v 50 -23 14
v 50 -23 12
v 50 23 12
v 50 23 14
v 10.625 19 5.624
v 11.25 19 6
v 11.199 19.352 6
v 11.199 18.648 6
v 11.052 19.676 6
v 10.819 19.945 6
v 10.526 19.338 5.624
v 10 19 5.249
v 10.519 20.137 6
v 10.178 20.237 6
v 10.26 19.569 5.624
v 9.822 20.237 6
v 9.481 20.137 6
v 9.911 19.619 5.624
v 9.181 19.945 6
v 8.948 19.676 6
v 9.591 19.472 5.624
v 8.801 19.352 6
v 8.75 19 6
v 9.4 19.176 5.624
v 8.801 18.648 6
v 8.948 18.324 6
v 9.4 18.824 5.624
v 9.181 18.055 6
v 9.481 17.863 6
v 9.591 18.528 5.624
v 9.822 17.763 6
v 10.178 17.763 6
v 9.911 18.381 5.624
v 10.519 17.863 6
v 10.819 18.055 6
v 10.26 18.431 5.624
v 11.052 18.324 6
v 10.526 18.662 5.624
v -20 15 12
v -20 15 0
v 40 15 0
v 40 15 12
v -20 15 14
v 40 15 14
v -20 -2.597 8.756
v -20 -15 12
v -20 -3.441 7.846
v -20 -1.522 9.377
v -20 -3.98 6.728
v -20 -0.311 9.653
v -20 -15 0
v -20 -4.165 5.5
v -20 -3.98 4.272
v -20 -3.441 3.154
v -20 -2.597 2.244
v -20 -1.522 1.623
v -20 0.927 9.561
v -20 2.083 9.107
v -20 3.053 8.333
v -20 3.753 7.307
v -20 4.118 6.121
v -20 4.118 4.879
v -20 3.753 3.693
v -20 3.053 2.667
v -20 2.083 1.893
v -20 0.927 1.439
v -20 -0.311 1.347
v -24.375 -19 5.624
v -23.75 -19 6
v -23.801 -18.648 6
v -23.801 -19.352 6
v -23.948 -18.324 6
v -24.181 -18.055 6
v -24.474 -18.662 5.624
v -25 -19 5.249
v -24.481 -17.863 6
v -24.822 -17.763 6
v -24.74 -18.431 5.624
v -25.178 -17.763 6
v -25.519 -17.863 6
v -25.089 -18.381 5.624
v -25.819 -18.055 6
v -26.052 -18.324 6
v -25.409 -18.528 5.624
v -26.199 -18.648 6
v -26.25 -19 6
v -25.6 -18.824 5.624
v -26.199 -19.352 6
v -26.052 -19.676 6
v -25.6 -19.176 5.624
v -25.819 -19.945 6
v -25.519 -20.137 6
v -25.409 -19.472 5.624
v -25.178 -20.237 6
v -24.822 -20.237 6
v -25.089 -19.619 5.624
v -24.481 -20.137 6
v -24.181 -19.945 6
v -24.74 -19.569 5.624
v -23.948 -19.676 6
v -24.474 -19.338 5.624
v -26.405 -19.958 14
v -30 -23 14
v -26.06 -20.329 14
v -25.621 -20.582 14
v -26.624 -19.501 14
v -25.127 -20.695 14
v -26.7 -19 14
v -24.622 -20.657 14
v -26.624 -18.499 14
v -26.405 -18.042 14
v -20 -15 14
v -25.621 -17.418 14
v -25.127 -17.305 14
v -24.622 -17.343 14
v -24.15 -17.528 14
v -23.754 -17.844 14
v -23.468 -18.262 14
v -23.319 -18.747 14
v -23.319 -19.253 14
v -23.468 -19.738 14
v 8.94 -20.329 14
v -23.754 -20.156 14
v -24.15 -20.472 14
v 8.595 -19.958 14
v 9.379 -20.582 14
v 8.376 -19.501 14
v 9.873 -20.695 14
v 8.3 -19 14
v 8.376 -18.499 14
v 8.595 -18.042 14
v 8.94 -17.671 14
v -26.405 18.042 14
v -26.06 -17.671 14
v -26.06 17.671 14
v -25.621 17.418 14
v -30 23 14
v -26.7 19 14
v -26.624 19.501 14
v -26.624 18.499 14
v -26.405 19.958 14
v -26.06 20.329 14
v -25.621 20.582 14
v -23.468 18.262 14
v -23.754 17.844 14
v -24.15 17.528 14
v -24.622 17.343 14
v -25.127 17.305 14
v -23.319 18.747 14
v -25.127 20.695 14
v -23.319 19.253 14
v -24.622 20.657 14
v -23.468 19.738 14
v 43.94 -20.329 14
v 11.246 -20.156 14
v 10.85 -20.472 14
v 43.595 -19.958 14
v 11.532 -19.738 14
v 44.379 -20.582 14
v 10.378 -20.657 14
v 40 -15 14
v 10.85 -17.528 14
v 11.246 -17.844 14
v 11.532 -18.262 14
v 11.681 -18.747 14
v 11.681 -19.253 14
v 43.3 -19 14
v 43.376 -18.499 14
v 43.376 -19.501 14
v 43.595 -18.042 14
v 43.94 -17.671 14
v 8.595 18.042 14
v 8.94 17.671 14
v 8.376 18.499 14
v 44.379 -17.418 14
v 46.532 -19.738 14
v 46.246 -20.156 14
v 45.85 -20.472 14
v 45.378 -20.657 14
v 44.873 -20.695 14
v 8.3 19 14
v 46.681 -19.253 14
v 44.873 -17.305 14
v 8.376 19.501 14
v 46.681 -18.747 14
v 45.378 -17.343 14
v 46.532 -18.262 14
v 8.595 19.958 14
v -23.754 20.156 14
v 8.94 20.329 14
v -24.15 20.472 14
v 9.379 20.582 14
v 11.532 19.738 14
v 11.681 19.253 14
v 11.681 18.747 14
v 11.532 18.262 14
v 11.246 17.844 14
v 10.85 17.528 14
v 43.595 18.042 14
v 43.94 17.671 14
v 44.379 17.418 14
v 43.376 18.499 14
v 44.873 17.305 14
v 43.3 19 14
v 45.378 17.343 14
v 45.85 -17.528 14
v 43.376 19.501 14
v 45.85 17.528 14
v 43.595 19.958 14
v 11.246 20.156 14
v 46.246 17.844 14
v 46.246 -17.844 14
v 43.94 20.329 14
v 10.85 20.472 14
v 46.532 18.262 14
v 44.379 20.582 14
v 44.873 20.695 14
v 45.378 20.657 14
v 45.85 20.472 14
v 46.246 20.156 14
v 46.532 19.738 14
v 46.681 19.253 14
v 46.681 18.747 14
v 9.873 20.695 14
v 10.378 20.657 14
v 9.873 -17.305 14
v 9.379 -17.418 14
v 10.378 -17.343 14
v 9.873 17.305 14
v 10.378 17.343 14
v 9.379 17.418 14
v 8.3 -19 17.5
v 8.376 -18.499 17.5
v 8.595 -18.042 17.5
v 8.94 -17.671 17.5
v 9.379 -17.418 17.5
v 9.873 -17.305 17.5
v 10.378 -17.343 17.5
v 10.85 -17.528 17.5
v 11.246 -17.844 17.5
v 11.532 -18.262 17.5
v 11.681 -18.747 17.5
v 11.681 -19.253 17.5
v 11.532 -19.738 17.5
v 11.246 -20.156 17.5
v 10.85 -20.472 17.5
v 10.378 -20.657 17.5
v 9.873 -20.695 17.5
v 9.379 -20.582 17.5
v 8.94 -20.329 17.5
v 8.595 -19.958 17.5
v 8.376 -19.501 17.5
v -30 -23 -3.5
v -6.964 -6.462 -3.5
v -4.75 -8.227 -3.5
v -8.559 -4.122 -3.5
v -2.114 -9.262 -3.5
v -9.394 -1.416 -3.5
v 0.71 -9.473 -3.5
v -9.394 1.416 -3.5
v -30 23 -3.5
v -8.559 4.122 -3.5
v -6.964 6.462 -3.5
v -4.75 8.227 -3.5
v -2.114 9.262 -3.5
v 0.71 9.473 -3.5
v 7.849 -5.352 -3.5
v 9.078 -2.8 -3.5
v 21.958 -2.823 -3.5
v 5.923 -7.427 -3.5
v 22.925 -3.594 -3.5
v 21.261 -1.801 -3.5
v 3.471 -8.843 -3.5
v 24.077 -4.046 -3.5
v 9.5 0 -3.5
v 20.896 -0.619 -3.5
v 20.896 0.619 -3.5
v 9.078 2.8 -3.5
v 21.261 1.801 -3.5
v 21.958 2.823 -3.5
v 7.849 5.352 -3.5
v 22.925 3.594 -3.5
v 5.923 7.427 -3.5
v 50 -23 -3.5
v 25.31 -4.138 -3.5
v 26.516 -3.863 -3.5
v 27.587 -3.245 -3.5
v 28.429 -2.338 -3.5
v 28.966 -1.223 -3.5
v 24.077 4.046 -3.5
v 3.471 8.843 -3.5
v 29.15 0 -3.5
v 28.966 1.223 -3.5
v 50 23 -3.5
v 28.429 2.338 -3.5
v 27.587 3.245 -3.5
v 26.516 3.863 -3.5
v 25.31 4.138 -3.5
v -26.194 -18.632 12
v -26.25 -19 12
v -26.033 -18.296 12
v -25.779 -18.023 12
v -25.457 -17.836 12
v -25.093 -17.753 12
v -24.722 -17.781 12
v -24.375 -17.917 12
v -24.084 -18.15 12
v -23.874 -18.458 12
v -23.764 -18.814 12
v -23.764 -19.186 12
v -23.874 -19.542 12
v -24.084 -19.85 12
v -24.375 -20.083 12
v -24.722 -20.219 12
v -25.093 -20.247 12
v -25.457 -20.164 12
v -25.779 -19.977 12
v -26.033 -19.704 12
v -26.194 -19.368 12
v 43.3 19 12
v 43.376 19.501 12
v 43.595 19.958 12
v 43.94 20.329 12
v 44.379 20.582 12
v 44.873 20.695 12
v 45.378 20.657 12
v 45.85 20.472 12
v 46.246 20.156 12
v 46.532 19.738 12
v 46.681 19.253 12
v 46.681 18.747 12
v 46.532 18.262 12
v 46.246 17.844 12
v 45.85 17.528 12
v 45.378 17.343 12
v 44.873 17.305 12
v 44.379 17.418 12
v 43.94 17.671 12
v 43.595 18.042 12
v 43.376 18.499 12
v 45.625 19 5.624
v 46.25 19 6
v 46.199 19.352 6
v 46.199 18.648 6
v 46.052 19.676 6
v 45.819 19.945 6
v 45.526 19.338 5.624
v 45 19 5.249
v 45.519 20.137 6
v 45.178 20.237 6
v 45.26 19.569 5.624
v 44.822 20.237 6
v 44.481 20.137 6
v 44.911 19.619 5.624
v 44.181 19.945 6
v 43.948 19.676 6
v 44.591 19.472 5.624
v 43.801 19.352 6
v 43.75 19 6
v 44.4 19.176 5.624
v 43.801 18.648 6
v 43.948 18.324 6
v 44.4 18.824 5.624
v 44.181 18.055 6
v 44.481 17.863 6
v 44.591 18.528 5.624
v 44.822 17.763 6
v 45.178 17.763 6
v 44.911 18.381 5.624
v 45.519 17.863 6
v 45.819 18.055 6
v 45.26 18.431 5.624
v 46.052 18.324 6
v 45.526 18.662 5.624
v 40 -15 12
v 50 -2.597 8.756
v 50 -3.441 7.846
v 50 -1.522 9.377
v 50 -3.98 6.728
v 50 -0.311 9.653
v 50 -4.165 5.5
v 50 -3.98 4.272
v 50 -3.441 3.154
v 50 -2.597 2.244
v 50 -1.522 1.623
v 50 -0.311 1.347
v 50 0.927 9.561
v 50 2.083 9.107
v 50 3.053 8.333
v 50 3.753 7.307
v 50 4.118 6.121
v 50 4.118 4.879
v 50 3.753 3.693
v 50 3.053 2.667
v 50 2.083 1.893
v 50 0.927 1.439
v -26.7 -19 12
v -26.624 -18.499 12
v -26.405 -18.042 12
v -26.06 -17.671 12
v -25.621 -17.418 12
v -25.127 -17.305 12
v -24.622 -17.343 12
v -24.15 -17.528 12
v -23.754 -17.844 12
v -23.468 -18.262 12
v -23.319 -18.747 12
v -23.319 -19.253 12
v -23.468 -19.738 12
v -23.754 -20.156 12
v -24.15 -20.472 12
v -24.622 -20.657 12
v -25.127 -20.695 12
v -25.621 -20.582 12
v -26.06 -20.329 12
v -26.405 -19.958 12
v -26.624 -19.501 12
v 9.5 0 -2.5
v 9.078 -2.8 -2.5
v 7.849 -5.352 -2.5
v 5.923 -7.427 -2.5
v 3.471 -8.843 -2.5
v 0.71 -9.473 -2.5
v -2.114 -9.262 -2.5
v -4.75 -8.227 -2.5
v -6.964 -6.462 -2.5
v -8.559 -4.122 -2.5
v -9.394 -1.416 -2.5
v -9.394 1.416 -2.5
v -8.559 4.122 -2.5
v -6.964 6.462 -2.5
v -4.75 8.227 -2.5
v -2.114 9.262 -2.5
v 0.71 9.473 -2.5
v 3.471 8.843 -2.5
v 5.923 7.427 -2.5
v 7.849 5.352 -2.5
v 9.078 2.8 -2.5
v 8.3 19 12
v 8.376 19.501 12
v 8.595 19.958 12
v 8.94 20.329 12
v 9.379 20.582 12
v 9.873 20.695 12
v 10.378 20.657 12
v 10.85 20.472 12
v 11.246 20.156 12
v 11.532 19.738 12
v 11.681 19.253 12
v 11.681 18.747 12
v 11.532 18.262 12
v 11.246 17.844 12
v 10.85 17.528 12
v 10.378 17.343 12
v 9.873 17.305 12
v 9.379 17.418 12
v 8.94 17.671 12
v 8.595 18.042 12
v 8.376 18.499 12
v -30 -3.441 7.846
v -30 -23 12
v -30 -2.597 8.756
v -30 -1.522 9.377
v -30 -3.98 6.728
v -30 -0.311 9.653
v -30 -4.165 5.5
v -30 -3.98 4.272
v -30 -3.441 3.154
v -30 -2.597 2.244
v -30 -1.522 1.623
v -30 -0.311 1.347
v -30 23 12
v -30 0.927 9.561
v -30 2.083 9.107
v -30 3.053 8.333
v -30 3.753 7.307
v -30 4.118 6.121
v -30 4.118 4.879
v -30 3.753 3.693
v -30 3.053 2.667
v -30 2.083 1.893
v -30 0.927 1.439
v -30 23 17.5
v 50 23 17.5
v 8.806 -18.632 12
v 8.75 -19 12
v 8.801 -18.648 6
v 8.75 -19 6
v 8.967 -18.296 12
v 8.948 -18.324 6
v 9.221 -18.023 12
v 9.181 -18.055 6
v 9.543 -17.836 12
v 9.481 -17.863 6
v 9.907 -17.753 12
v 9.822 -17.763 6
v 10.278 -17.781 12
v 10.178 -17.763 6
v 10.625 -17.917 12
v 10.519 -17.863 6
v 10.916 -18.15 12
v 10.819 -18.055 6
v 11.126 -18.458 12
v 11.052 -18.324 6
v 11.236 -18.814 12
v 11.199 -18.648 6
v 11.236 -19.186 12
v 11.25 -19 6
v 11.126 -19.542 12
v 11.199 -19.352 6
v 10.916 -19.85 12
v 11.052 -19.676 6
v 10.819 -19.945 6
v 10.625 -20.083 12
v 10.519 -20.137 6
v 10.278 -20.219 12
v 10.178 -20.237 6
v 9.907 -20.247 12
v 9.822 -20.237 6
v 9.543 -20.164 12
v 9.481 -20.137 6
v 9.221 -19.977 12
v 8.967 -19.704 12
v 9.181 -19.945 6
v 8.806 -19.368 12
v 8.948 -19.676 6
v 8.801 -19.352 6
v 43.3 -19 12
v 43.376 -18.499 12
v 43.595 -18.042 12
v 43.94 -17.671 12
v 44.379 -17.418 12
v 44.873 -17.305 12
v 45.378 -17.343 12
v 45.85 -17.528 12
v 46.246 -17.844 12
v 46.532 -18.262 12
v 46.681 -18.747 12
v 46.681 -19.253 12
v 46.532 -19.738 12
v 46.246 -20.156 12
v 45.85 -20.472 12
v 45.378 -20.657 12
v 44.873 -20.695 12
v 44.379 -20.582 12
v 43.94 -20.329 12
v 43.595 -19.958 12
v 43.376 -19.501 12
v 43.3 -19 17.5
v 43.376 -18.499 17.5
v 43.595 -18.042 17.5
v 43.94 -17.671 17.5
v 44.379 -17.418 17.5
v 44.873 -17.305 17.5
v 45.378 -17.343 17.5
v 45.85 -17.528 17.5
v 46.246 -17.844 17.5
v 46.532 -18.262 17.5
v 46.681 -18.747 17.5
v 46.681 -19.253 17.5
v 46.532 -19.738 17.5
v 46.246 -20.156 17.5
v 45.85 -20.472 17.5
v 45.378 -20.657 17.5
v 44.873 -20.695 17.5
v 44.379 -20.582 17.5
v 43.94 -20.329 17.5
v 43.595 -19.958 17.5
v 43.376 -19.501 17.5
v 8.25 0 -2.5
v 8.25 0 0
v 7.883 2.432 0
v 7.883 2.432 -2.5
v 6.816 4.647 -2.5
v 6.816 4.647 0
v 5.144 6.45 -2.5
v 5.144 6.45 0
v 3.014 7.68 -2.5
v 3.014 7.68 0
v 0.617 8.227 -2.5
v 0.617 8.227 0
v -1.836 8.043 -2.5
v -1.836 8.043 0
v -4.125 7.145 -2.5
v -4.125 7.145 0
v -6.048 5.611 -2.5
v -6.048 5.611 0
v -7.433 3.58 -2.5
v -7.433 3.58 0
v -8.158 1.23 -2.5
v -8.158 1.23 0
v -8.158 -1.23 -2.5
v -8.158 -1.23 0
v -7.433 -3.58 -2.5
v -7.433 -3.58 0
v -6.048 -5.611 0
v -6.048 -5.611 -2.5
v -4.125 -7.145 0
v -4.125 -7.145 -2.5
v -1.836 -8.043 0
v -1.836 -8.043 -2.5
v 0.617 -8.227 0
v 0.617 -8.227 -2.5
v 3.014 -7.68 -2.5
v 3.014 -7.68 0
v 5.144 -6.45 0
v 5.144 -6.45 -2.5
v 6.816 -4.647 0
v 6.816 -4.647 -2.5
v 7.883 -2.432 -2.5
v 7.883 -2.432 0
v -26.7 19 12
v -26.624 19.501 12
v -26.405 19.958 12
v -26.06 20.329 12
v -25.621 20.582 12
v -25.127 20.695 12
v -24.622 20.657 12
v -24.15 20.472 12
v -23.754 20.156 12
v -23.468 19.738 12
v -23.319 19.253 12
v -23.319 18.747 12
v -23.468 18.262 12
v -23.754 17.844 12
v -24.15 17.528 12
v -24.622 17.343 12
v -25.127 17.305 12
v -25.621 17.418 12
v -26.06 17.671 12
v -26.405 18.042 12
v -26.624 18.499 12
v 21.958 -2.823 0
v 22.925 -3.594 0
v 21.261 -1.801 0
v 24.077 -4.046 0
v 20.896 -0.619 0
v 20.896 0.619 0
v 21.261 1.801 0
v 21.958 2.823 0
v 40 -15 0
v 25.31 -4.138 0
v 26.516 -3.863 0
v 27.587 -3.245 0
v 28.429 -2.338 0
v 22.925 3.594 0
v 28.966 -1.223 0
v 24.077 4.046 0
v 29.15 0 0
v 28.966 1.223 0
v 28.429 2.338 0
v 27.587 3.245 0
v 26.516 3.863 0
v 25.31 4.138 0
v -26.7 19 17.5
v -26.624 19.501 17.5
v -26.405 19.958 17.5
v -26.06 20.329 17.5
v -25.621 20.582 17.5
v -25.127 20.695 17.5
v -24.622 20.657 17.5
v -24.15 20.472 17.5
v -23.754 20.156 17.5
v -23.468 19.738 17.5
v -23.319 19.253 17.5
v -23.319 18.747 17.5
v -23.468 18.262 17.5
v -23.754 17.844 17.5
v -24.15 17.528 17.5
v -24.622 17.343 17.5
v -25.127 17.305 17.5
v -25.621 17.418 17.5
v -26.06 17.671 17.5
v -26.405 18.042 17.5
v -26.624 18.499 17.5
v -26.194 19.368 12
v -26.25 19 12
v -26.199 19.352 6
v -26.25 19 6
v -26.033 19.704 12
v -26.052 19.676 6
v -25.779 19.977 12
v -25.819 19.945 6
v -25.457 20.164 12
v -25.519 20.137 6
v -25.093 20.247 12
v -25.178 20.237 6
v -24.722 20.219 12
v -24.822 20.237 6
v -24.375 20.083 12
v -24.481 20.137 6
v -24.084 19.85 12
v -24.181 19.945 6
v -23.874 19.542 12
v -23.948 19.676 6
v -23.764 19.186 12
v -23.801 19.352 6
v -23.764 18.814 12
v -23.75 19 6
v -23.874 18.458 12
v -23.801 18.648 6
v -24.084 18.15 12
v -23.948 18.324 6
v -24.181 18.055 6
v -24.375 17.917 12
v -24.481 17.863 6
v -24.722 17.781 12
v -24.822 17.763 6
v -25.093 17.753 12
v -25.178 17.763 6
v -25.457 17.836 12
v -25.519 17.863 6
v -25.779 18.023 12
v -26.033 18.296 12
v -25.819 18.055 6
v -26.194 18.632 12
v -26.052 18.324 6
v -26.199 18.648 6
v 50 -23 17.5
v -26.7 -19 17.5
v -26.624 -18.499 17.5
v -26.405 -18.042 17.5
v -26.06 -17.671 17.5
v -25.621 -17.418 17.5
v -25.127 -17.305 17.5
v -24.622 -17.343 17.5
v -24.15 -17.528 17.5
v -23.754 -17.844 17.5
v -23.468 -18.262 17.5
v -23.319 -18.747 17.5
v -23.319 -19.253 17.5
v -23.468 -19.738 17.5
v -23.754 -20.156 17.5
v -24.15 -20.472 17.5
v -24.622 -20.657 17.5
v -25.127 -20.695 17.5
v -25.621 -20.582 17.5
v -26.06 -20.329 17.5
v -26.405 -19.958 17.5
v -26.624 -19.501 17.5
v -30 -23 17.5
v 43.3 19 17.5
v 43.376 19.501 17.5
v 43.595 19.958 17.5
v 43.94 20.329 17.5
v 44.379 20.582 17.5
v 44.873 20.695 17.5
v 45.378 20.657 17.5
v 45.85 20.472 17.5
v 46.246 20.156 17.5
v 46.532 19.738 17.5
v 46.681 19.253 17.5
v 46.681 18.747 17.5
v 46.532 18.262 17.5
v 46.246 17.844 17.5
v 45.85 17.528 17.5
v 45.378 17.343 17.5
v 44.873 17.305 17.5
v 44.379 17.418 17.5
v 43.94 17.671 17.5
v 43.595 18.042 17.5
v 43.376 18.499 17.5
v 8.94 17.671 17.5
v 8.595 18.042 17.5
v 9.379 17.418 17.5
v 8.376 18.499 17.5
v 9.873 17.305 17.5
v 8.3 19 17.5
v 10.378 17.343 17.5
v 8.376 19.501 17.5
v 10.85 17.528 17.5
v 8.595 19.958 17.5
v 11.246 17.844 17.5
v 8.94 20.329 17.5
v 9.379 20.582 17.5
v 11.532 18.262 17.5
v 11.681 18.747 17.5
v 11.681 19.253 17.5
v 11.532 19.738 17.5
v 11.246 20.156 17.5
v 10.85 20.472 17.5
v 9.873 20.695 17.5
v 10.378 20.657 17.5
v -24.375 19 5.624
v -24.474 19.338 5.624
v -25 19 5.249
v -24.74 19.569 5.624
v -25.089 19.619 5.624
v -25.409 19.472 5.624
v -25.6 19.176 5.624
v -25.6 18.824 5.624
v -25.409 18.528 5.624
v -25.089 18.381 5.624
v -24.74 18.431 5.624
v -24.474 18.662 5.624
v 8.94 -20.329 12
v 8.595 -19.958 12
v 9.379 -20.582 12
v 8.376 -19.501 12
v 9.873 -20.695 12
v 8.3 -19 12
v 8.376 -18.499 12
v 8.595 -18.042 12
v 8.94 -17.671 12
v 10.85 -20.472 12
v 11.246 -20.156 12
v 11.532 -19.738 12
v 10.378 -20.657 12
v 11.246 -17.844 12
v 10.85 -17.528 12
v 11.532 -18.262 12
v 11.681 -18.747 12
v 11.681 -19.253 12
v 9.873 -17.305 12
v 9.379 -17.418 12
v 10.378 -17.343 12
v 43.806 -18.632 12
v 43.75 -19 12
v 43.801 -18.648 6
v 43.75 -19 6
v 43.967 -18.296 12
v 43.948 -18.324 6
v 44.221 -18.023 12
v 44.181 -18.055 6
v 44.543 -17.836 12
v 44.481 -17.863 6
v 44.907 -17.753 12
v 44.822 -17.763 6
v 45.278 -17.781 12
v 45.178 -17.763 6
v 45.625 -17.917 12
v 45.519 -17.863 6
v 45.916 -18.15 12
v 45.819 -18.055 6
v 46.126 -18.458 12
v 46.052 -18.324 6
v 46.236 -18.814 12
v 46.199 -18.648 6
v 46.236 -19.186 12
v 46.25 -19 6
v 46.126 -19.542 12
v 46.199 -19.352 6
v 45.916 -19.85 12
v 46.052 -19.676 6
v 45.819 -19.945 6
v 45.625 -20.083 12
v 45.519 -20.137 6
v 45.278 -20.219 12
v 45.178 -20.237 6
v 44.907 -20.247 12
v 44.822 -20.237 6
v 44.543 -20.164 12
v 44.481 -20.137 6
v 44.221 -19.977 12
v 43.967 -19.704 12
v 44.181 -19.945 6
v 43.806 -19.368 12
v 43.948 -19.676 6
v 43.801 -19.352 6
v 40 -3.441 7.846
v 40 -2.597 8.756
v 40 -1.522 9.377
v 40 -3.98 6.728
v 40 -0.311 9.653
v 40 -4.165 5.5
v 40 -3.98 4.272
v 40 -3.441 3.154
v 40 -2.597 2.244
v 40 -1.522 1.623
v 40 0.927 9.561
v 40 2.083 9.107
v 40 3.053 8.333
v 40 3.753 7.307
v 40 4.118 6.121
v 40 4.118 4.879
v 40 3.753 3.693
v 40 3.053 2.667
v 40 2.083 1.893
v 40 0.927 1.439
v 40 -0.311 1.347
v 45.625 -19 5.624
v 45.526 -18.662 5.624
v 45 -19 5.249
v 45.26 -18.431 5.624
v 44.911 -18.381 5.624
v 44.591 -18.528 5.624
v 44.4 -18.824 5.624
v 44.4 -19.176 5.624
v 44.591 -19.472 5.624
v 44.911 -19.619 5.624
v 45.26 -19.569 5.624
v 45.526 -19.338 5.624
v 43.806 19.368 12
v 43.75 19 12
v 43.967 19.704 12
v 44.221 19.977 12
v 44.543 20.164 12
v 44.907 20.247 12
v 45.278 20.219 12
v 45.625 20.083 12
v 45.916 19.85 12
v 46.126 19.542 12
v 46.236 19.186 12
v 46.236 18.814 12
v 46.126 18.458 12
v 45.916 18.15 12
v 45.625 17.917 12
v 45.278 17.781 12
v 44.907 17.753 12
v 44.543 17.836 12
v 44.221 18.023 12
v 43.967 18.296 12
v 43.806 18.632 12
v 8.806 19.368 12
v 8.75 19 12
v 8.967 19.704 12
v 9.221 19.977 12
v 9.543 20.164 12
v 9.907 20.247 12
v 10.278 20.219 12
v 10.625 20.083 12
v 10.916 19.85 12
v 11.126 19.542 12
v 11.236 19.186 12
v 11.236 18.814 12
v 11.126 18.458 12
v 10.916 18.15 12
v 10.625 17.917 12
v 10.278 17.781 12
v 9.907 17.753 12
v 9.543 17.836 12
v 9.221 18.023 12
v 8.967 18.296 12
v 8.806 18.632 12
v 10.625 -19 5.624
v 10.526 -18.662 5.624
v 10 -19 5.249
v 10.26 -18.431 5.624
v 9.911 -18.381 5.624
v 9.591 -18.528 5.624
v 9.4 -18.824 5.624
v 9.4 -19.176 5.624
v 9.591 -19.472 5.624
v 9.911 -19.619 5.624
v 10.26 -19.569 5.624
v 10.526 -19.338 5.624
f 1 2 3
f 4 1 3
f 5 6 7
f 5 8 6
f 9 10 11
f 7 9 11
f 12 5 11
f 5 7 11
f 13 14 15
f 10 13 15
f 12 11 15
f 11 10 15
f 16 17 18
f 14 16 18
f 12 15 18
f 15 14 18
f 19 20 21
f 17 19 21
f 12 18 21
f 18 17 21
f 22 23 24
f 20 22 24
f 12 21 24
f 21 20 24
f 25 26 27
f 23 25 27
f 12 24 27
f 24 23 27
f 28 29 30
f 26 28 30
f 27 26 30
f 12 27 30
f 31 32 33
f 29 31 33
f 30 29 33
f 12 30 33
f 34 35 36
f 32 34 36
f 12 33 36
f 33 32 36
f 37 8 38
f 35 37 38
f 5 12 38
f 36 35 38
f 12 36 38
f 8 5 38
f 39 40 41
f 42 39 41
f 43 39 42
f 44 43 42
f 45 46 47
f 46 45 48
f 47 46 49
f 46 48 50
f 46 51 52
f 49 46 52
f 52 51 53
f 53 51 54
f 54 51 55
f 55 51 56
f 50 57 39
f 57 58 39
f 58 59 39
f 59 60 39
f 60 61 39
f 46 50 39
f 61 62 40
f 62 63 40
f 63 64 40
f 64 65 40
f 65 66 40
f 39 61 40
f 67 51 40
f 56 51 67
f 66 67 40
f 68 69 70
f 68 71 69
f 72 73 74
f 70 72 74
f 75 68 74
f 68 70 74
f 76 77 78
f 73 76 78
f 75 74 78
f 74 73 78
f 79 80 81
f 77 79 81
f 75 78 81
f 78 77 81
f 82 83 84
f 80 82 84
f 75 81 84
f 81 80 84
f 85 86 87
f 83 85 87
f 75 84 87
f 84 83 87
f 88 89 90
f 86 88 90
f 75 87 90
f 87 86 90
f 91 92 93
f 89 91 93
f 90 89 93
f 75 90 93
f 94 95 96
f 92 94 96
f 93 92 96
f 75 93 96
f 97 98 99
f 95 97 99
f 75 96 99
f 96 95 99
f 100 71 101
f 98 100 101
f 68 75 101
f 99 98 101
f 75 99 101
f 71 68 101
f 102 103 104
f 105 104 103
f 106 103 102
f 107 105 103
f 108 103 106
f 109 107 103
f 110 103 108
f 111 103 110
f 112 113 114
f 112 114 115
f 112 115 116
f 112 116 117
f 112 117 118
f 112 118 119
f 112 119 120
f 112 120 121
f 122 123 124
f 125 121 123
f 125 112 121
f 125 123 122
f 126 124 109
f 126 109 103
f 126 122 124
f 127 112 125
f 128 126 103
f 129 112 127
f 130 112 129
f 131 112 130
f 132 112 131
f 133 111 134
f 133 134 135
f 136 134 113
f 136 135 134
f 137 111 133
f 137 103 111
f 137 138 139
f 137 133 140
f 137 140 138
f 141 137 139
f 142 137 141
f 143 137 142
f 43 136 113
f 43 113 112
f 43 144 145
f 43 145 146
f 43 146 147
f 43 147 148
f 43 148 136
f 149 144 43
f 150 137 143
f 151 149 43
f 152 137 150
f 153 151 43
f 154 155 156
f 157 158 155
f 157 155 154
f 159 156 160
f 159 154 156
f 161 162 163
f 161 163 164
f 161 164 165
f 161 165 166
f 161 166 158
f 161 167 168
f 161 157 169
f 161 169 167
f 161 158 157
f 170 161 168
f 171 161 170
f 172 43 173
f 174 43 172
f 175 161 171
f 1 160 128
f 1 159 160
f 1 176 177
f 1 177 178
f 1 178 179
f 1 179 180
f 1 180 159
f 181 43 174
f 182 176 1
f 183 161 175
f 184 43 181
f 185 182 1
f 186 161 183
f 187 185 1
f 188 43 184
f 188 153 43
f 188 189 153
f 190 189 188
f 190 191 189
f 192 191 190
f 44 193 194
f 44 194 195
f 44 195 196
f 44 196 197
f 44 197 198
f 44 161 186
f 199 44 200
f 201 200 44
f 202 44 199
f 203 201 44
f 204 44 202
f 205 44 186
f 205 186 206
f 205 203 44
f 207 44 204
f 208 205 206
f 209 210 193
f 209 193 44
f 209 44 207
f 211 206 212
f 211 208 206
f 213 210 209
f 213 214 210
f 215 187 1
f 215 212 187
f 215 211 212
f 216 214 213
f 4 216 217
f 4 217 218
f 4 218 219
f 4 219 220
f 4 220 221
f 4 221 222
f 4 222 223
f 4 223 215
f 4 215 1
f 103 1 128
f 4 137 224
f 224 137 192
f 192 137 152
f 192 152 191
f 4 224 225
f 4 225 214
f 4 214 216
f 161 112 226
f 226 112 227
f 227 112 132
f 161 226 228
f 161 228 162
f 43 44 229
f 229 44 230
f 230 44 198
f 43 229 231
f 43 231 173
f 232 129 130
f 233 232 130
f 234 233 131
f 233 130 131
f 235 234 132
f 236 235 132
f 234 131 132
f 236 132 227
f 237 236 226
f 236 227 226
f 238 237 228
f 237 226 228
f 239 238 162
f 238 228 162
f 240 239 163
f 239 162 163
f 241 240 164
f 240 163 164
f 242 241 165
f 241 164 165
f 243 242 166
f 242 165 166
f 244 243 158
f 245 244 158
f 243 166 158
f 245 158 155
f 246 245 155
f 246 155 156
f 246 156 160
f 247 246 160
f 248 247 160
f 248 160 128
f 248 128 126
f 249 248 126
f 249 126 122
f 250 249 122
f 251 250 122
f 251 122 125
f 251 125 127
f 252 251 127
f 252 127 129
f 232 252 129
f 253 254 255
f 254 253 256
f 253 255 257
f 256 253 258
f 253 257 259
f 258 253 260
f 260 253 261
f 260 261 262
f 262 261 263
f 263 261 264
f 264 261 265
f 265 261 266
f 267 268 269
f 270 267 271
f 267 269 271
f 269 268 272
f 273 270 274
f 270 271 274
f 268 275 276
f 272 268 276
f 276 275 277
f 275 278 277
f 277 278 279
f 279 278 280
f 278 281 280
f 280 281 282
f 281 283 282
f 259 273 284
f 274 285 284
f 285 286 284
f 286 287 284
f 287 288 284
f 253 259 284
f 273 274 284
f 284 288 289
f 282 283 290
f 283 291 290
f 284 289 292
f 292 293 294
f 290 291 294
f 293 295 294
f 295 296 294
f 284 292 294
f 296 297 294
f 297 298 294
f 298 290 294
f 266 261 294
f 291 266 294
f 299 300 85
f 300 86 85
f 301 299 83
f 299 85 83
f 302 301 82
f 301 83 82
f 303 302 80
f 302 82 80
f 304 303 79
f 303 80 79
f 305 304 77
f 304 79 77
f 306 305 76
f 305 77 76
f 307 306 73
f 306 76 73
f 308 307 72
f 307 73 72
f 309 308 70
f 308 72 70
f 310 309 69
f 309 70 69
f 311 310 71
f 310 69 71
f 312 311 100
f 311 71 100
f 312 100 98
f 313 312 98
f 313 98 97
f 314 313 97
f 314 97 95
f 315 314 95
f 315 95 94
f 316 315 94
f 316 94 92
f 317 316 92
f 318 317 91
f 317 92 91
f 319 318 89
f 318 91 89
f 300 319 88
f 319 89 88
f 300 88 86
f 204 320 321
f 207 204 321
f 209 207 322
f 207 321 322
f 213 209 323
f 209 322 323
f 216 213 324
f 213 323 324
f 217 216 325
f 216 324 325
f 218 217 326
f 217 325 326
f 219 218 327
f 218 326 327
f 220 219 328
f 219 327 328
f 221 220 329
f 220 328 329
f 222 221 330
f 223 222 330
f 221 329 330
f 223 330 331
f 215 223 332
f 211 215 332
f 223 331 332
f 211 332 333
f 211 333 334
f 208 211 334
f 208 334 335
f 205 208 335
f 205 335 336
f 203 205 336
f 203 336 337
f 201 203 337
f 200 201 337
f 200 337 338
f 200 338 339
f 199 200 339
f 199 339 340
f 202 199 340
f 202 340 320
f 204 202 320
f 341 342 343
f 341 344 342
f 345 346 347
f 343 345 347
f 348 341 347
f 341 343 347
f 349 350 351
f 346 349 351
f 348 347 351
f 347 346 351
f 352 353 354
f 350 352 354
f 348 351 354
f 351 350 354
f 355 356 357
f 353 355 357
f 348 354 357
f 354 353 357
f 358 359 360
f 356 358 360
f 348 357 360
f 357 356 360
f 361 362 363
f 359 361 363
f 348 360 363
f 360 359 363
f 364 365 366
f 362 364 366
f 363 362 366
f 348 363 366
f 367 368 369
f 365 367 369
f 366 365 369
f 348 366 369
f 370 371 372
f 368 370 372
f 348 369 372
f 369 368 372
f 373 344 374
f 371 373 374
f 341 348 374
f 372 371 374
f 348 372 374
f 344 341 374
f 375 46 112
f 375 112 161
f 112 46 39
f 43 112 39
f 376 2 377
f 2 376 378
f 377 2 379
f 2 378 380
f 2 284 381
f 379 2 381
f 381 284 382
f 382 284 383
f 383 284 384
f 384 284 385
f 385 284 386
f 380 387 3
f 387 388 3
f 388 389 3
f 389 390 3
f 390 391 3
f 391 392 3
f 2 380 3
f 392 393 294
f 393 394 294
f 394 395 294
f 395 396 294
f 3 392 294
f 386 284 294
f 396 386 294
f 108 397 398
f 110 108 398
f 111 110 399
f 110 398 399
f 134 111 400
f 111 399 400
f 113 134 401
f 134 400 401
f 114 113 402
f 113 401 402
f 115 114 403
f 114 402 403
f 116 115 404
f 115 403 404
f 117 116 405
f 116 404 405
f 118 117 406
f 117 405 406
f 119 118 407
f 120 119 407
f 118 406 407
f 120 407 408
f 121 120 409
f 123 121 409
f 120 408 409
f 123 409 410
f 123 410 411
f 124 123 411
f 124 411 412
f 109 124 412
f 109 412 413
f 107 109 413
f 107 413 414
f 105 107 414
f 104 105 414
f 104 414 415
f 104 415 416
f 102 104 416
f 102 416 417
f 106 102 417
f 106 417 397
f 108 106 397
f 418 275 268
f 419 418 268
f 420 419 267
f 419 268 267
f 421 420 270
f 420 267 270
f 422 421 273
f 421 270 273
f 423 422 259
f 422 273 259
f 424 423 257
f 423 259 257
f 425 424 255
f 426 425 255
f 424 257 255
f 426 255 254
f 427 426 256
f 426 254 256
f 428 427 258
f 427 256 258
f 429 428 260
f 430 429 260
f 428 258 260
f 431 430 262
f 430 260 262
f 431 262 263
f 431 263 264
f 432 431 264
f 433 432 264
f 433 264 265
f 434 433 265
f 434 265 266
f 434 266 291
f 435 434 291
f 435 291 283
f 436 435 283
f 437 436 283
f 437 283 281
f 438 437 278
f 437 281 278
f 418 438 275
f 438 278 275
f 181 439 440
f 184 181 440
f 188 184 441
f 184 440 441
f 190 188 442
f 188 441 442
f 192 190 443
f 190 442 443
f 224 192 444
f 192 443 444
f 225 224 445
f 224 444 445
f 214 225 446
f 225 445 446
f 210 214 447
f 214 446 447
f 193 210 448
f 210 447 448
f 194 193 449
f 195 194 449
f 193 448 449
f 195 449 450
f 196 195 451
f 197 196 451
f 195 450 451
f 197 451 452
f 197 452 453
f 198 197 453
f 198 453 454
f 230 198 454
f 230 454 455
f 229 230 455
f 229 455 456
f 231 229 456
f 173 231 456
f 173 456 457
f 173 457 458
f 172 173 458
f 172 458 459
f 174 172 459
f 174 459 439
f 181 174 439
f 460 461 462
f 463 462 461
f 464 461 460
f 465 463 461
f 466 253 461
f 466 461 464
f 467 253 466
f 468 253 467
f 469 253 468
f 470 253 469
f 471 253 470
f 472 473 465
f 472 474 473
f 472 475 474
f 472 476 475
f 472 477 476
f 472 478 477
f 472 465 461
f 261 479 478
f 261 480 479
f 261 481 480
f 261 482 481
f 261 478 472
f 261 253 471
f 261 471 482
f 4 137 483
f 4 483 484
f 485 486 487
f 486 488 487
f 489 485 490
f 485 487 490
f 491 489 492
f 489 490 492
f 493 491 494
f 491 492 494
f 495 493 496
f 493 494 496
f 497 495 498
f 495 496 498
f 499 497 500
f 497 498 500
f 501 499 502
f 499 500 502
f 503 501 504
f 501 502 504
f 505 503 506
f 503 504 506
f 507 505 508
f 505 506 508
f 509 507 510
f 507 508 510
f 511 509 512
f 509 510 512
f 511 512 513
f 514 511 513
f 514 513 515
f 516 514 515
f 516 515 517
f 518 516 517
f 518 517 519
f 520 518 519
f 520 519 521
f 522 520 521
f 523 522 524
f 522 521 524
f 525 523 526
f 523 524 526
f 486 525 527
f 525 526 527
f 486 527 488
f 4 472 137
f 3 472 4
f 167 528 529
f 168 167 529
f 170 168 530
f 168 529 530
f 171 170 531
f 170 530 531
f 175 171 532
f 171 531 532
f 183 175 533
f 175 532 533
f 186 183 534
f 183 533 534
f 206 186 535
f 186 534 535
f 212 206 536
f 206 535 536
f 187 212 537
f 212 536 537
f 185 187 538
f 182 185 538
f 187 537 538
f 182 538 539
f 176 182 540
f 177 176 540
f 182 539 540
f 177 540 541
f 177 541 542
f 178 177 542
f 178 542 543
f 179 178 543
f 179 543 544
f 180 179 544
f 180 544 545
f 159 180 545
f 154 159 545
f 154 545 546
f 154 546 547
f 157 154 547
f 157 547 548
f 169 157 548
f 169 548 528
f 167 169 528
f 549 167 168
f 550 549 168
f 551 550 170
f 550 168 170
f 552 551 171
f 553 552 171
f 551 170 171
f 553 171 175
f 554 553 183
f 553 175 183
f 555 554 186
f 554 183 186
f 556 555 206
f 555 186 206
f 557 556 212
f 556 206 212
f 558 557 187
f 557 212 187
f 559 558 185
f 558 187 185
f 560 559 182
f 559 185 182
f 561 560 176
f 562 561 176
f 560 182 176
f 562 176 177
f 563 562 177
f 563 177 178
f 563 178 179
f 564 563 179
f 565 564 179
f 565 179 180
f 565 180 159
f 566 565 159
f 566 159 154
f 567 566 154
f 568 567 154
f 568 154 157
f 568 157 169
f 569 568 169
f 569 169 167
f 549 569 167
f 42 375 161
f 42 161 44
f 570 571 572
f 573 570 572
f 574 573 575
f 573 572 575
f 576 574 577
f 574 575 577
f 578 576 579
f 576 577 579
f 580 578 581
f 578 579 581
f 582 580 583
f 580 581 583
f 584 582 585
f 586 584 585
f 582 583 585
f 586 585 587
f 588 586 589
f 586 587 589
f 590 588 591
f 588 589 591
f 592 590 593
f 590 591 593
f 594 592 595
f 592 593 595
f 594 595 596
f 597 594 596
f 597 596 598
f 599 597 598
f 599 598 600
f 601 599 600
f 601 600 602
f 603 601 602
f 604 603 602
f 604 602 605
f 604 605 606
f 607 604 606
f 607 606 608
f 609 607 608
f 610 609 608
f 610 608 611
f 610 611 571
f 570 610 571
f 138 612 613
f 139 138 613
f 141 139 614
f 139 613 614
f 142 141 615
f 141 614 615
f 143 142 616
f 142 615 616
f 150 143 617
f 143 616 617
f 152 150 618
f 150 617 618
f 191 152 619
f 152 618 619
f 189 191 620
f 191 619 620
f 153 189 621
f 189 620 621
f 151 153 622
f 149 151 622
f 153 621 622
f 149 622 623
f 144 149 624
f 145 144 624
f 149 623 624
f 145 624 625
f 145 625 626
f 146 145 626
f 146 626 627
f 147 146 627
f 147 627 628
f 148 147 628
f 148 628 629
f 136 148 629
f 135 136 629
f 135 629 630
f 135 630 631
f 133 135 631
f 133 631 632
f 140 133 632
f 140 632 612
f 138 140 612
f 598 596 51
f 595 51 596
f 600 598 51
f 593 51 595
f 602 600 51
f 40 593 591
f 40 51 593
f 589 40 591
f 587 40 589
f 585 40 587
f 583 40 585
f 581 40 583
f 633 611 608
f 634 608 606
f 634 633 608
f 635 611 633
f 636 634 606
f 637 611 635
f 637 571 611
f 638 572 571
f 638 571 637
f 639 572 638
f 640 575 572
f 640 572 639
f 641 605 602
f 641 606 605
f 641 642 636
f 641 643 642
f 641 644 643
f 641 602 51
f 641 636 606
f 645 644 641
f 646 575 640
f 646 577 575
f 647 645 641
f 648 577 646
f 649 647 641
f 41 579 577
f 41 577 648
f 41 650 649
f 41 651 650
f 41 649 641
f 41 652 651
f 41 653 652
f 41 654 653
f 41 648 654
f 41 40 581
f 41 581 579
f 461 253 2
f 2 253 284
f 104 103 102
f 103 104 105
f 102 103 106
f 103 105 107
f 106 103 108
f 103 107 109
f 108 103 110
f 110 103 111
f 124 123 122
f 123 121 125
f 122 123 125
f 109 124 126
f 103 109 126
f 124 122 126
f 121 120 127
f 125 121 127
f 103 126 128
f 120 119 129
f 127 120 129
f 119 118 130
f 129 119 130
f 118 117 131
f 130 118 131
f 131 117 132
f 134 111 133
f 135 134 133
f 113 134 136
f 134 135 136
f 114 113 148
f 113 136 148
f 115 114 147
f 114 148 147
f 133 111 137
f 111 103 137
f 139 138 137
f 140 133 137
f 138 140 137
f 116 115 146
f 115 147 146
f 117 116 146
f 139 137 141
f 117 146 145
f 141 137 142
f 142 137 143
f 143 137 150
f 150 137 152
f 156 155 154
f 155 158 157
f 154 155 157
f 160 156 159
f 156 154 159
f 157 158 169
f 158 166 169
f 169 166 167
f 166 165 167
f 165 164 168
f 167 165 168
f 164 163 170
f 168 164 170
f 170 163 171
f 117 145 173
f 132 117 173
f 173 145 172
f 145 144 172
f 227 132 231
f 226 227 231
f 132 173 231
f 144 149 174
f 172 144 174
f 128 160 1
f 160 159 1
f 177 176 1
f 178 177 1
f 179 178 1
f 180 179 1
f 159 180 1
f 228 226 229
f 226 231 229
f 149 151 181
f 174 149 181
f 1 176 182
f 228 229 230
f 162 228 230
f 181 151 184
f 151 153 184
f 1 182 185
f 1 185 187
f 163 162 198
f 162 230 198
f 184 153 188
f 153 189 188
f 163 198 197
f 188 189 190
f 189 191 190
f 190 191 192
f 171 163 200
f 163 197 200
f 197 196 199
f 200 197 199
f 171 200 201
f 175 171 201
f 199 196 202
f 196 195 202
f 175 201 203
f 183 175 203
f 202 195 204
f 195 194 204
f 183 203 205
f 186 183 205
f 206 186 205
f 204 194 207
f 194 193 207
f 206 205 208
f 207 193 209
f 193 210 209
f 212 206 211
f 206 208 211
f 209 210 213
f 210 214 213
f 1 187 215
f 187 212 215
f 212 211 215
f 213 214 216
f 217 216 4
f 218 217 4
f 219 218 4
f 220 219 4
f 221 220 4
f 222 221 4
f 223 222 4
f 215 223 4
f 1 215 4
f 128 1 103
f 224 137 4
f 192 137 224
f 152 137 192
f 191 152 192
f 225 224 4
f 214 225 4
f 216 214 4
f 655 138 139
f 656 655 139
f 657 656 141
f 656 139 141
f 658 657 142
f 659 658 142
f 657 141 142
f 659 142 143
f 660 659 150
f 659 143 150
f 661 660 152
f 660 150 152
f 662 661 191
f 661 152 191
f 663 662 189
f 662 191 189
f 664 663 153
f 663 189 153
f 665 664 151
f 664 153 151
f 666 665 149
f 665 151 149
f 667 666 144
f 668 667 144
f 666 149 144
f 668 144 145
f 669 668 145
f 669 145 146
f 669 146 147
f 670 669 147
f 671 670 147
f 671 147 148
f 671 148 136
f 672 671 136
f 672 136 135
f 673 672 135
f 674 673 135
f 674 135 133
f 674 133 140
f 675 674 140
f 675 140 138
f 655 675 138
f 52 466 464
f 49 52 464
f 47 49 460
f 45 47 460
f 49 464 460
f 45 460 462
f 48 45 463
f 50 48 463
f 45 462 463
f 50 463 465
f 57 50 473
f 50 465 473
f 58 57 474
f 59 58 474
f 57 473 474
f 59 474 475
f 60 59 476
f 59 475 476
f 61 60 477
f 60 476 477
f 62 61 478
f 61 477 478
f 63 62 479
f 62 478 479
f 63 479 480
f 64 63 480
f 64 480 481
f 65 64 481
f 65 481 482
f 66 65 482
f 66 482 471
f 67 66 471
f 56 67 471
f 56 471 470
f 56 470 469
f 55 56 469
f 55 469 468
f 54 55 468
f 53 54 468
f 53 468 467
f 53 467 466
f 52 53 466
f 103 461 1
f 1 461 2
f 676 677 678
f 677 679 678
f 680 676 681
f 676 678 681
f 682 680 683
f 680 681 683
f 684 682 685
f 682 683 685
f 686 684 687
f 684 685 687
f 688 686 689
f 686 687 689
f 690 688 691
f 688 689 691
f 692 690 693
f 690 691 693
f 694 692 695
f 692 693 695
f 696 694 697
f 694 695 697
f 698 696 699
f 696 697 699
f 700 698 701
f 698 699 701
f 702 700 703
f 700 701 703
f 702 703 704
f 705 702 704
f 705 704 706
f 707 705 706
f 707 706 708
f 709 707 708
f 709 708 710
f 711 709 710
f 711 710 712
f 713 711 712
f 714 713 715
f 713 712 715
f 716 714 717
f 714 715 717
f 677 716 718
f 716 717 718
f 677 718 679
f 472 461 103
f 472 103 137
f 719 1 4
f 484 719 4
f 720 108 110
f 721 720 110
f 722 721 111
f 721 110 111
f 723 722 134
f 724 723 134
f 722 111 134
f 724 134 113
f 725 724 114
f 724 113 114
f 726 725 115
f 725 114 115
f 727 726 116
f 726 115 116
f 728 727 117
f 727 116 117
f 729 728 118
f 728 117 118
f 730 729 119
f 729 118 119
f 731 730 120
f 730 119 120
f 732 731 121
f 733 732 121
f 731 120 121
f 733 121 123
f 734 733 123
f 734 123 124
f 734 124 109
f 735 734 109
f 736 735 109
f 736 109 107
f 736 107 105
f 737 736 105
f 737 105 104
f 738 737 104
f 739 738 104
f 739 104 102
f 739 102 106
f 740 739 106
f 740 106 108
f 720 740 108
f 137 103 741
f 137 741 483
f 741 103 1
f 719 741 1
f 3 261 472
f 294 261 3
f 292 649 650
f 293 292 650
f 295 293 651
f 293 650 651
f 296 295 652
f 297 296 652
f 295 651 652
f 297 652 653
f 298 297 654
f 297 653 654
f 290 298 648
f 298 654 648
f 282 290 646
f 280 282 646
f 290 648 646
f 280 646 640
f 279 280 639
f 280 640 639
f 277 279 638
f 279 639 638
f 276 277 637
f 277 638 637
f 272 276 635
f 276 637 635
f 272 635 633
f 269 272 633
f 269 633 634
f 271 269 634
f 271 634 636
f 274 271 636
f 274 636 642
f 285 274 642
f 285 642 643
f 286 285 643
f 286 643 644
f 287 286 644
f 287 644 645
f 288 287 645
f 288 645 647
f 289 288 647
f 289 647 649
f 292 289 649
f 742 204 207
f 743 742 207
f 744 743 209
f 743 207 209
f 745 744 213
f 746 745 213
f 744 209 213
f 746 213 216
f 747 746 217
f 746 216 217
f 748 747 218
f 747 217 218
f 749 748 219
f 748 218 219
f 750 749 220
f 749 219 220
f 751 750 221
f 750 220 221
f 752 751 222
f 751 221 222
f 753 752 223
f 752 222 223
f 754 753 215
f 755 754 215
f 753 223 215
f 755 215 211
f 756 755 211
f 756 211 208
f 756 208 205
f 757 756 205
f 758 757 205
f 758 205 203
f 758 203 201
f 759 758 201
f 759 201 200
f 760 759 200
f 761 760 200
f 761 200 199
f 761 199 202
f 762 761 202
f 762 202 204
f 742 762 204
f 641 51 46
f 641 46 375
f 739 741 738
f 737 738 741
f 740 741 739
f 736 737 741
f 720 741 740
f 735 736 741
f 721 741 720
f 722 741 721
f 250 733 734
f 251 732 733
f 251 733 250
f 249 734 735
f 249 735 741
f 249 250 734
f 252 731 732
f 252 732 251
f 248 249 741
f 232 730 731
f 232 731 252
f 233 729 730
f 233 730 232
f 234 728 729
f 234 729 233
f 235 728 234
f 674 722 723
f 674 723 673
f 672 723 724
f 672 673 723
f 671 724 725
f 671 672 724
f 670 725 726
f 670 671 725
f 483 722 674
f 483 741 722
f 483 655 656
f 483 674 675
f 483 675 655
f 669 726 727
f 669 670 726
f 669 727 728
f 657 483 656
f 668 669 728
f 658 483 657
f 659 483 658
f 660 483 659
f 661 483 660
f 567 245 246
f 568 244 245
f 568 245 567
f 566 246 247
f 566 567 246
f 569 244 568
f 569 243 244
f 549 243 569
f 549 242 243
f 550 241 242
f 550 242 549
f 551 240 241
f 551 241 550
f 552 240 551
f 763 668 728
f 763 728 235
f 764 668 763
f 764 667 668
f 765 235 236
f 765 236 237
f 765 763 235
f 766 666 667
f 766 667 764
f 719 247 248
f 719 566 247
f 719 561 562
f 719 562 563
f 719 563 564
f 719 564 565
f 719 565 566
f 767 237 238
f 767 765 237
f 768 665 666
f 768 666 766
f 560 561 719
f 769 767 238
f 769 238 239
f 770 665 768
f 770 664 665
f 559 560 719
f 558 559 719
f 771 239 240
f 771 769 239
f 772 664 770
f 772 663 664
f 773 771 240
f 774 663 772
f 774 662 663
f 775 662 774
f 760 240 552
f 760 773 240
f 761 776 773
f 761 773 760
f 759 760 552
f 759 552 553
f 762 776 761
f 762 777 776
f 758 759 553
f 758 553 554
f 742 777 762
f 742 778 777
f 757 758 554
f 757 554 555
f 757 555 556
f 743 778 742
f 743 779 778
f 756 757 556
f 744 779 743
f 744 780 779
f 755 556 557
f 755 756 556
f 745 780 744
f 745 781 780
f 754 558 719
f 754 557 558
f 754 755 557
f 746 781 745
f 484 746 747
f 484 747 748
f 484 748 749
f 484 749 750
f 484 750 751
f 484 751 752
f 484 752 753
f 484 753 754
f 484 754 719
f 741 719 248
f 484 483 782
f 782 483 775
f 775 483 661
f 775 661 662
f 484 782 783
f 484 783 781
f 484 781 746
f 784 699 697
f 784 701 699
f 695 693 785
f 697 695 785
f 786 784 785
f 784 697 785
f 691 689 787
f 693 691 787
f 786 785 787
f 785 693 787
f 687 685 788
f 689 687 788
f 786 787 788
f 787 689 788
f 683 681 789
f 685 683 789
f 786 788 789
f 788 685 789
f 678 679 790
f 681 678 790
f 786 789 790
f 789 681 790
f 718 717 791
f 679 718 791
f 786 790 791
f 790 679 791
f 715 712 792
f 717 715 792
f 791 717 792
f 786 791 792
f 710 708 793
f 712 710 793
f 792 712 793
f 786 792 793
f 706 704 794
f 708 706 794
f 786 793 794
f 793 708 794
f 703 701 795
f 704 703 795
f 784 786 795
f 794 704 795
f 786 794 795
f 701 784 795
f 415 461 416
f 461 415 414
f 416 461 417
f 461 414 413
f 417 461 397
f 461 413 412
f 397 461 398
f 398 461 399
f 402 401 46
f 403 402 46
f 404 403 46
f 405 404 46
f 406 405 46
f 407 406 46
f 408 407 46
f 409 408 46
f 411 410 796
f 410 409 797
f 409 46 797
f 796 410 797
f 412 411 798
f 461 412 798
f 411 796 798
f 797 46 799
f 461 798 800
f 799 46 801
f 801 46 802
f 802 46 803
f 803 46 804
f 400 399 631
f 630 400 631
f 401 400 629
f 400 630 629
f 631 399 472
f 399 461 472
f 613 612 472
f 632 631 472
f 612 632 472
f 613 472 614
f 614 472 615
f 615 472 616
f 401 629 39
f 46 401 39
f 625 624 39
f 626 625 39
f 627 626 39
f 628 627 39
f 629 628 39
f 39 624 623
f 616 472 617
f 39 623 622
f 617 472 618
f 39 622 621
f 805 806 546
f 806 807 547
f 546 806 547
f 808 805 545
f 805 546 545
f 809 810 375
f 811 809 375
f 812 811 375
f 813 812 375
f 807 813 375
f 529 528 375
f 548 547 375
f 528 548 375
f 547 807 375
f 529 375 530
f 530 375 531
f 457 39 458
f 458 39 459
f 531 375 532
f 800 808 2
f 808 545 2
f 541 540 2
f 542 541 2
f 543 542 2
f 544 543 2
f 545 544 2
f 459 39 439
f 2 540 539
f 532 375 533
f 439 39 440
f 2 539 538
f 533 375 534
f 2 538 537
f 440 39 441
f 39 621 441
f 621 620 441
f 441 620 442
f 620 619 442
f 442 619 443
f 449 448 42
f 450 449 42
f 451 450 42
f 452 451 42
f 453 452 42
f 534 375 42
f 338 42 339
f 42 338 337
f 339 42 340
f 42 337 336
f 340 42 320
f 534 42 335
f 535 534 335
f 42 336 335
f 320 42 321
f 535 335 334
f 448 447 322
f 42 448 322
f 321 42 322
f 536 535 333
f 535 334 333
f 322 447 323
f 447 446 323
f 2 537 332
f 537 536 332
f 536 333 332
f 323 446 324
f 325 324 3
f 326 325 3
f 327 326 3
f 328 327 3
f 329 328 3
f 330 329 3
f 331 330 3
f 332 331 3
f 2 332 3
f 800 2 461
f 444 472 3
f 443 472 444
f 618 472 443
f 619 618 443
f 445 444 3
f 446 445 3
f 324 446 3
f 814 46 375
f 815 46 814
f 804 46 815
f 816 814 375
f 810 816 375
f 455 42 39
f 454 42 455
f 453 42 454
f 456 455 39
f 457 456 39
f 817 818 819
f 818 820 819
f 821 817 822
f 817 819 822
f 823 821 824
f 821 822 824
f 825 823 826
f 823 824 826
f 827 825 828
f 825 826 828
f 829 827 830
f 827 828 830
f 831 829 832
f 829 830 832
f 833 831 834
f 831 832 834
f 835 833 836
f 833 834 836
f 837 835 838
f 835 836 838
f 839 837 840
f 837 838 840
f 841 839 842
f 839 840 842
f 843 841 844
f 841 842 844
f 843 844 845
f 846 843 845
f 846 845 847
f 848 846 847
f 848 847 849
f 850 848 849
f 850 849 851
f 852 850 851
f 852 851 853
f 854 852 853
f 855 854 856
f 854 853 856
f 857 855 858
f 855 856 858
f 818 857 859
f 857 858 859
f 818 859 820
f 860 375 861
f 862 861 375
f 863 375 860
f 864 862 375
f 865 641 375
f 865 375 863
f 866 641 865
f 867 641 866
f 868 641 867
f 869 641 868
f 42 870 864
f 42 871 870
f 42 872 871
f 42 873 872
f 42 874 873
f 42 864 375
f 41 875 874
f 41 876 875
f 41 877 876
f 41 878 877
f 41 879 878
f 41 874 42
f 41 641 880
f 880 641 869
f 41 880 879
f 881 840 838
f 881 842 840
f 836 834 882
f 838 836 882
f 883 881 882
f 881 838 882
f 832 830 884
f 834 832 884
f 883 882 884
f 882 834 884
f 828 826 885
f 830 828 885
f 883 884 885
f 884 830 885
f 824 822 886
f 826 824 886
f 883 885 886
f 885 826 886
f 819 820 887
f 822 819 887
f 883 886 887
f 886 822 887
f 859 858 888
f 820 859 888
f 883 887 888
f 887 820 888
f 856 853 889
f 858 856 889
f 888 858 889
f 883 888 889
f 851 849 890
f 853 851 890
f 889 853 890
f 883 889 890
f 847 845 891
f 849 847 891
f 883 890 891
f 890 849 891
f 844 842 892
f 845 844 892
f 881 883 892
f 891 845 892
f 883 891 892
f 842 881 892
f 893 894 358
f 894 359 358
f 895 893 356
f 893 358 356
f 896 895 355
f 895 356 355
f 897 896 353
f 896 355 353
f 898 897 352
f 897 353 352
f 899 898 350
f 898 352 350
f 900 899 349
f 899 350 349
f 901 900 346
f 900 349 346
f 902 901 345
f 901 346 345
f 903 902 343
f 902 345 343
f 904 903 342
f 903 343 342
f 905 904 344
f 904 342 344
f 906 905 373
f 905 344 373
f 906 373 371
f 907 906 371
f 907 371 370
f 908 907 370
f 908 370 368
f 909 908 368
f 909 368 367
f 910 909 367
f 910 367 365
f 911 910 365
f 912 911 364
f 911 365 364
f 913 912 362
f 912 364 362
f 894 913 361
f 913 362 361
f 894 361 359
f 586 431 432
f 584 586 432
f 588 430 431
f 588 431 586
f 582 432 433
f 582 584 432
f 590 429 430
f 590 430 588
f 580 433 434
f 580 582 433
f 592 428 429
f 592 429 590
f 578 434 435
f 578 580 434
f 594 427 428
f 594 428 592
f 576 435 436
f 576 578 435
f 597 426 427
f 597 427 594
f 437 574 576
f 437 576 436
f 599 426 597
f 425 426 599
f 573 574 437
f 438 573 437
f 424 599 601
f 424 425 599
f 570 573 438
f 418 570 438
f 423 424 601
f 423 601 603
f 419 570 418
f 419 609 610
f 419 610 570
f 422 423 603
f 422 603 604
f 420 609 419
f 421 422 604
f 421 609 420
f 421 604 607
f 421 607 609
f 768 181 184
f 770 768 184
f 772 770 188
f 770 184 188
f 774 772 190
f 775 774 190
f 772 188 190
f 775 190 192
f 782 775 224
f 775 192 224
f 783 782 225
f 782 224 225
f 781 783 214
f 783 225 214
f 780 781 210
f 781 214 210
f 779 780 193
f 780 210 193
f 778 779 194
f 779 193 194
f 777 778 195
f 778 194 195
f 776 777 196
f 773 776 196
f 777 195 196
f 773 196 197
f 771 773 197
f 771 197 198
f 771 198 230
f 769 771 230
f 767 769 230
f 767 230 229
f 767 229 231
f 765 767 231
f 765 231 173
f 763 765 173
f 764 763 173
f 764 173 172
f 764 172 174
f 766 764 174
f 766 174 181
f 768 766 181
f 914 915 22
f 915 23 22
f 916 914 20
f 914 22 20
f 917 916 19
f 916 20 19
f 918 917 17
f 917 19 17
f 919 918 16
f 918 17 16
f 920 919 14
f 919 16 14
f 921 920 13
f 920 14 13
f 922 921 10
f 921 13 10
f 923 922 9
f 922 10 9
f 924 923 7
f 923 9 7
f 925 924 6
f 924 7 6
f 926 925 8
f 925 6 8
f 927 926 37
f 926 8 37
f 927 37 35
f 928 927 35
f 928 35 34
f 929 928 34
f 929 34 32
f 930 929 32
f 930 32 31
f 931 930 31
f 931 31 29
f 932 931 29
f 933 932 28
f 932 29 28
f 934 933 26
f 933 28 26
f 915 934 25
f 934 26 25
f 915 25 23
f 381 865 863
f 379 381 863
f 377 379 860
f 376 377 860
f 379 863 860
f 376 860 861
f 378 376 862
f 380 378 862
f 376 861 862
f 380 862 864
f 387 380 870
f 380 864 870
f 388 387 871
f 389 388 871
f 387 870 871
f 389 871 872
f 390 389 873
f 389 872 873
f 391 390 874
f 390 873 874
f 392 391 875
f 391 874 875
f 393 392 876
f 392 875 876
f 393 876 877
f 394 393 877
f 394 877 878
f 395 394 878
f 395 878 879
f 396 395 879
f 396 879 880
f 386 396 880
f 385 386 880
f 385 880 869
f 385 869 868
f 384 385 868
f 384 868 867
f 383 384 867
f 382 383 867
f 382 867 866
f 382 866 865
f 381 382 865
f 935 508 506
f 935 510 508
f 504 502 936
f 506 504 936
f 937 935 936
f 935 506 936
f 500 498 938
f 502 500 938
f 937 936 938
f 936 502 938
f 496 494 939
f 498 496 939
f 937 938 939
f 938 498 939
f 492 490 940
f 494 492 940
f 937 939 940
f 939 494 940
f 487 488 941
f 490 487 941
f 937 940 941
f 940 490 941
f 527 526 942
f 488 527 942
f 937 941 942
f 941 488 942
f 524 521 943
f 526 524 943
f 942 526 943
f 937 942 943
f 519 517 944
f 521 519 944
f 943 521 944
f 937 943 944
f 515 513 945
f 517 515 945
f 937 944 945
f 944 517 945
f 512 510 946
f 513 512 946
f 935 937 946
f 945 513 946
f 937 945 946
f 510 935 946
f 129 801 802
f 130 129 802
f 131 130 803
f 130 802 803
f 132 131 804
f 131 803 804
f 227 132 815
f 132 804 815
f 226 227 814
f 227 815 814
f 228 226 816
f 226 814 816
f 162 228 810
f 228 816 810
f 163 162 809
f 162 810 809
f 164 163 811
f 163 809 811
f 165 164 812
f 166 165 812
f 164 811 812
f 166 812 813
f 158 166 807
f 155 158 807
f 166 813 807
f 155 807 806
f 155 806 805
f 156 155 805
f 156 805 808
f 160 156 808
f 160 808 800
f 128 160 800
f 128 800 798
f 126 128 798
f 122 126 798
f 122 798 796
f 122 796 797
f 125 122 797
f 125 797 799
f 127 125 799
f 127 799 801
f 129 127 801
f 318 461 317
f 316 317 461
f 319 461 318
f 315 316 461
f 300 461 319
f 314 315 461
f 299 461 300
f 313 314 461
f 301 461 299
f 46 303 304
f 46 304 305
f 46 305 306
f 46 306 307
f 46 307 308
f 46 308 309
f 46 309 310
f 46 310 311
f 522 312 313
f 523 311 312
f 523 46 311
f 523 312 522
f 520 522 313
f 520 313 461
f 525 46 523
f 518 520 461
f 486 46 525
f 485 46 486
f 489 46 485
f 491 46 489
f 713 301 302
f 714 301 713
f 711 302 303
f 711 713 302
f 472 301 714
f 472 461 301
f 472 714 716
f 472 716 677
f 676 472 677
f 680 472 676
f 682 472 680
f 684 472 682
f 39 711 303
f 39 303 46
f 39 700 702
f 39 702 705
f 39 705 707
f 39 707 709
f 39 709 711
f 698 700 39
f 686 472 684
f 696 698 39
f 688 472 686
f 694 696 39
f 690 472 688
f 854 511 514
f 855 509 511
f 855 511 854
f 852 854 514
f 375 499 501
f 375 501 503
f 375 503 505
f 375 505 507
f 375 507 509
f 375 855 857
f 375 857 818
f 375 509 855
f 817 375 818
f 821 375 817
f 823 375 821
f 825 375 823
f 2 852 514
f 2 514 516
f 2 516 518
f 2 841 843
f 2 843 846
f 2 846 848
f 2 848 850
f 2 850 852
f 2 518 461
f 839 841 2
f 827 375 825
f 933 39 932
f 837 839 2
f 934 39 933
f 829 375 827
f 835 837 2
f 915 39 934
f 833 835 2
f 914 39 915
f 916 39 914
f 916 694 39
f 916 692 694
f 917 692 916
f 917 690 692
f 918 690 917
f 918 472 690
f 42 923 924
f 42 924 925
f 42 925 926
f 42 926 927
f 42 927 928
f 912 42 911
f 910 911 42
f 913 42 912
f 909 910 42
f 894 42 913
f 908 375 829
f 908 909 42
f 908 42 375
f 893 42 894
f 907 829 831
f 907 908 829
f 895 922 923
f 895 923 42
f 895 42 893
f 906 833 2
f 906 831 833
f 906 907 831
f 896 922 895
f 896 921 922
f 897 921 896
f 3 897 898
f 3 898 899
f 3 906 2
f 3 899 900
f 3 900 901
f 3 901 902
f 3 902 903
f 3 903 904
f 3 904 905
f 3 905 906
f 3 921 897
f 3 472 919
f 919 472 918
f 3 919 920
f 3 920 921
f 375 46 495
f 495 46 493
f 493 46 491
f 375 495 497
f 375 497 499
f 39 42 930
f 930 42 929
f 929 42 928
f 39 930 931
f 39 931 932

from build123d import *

# Parameters (mm, degrees)
F3_W      = 80
F3_H      = 46
F4_DEPTH  = 3.5
F5_W      = 80
F5_H      = 46
F5_W_2    = 60
F5_H_2    = 30
F6_DEPTH  = 12
F7_R      = 4.15
F7_R_2    = 8.25
F8_DEPTH  = 25
F9_R      = 9.5
F10_DEPTH = 1
F13_D     = 8.33
F15_D     = 2.5
F15_DEPTH = 6
F15_TIP   = 0.7510757738
F16_W     = 80
F16_H     = 46
F16_W_2   = 60
F16_H_2   = 30
F17_DEPTH = 2
F19_D     = 3.4
F20_W     = 80
F20_H     = 46
F21_DEPTH = 3.5
F23_D     = 3.4
F23_DEPTH = 6
F23_TIP   = 1.0214630523


with BuildPart() as f4:
    # F3 (on Top) → F4 (new body)
    with BuildSketch(Plane.XY):
        with Locations((10, 0)):
            Rectangle(F3_W, F3_H)
    extrude(amount=-F4_DEPTH)

    # F5 (on Top) → F6 (join, through all)
    with BuildSketch(Plane.XY):
        with Locations((10, 0)):
            Rectangle(F5_W, F5_H)
        with Locations((10, 0)):
            Rectangle(F5_W_2, F5_H_2, mode=Mode.SUBTRACT)
    extrude(amount=F6_DEPTH)

    # F7 (on Top) → F8 (cut)
    with BuildSketch(Plane.XY):
        with Locations((25, 0)):
            Circle(F7_R)
        Circle(F7_R_2)
    extrude(amount=-F8_DEPTH, mode=Mode.SUBTRACT)

    # F9 (on face) → F10 (cut)
    with BuildSketch(Plane(origin=(0, 0, -3.5), x_dir=(1, 0, 0), z_dir=(0, 0, -1))):
        Circle(F9_R)
    extrude(amount=-F10_DEPTH, mode=Mode.SUBTRACT)

    # F13 (through all)
    with Locations(Plane.YZ.offset(50)):
        with Locations((0, 5.5)):
            Hole(F13_D / 2)

    # F15
    with Locations(Plane.XY.offset(12)):
        with Locations((-25, 19), (-25, -19), (10, -19), (45, -19), (45, 19), (10, 19)):
            Hole(F15_D / 2, depth=F15_DEPTH)
            with Locations((0, 0, -(F15_DEPTH + F15_TIP / 2))):  # 118° drill point
                Cone(0, F15_D / 2, F15_TIP, mode=Mode.SUBTRACT)


with BuildPart() as f17:
    # F16 (on offset) → F17 (new body)
    with BuildSketch(Plane.XY.offset(12)):
        with Locations((10, 0)):
            Rectangle(F16_W, F16_H)
        with Locations((10, 0)):
            Rectangle(F16_W_2, F16_H_2, mode=Mode.SUBTRACT)
    extrude(amount=F17_DEPTH)

    # F19 (through all)
    with Locations(Plane.XY.offset(14)):
        with Locations((-25, -19), (10, -19), (45, -19), (45, 19), (10, 19), (-25, 19)):
            Hole(F19_D / 2)


with BuildPart() as f21:
    # F20 (on face) → F21 (new body)
    with BuildSketch(Plane.XY.offset(14)):
        with Locations((10, 0)):
            Rectangle(F20_W, F20_H)
    extrude(amount=F21_DEPTH)

    # F23
    with Locations(Plane.XY.offset(17.5)):
        with Locations((45, -19), (45, 19), (10, 19), (-25, 19), (-25, -19), (10, -19)):
            Hole(F23_D / 2, depth=F23_DEPTH)
            with Locations((0, 0, -(F23_DEPTH + F23_TIP / 2))):  # 118° drill point
                Cone(0, F23_D / 2, F23_TIP, mode=Mode.SUBTRACT)


solid = Compound([f4.part, f17.part, f21.part])
